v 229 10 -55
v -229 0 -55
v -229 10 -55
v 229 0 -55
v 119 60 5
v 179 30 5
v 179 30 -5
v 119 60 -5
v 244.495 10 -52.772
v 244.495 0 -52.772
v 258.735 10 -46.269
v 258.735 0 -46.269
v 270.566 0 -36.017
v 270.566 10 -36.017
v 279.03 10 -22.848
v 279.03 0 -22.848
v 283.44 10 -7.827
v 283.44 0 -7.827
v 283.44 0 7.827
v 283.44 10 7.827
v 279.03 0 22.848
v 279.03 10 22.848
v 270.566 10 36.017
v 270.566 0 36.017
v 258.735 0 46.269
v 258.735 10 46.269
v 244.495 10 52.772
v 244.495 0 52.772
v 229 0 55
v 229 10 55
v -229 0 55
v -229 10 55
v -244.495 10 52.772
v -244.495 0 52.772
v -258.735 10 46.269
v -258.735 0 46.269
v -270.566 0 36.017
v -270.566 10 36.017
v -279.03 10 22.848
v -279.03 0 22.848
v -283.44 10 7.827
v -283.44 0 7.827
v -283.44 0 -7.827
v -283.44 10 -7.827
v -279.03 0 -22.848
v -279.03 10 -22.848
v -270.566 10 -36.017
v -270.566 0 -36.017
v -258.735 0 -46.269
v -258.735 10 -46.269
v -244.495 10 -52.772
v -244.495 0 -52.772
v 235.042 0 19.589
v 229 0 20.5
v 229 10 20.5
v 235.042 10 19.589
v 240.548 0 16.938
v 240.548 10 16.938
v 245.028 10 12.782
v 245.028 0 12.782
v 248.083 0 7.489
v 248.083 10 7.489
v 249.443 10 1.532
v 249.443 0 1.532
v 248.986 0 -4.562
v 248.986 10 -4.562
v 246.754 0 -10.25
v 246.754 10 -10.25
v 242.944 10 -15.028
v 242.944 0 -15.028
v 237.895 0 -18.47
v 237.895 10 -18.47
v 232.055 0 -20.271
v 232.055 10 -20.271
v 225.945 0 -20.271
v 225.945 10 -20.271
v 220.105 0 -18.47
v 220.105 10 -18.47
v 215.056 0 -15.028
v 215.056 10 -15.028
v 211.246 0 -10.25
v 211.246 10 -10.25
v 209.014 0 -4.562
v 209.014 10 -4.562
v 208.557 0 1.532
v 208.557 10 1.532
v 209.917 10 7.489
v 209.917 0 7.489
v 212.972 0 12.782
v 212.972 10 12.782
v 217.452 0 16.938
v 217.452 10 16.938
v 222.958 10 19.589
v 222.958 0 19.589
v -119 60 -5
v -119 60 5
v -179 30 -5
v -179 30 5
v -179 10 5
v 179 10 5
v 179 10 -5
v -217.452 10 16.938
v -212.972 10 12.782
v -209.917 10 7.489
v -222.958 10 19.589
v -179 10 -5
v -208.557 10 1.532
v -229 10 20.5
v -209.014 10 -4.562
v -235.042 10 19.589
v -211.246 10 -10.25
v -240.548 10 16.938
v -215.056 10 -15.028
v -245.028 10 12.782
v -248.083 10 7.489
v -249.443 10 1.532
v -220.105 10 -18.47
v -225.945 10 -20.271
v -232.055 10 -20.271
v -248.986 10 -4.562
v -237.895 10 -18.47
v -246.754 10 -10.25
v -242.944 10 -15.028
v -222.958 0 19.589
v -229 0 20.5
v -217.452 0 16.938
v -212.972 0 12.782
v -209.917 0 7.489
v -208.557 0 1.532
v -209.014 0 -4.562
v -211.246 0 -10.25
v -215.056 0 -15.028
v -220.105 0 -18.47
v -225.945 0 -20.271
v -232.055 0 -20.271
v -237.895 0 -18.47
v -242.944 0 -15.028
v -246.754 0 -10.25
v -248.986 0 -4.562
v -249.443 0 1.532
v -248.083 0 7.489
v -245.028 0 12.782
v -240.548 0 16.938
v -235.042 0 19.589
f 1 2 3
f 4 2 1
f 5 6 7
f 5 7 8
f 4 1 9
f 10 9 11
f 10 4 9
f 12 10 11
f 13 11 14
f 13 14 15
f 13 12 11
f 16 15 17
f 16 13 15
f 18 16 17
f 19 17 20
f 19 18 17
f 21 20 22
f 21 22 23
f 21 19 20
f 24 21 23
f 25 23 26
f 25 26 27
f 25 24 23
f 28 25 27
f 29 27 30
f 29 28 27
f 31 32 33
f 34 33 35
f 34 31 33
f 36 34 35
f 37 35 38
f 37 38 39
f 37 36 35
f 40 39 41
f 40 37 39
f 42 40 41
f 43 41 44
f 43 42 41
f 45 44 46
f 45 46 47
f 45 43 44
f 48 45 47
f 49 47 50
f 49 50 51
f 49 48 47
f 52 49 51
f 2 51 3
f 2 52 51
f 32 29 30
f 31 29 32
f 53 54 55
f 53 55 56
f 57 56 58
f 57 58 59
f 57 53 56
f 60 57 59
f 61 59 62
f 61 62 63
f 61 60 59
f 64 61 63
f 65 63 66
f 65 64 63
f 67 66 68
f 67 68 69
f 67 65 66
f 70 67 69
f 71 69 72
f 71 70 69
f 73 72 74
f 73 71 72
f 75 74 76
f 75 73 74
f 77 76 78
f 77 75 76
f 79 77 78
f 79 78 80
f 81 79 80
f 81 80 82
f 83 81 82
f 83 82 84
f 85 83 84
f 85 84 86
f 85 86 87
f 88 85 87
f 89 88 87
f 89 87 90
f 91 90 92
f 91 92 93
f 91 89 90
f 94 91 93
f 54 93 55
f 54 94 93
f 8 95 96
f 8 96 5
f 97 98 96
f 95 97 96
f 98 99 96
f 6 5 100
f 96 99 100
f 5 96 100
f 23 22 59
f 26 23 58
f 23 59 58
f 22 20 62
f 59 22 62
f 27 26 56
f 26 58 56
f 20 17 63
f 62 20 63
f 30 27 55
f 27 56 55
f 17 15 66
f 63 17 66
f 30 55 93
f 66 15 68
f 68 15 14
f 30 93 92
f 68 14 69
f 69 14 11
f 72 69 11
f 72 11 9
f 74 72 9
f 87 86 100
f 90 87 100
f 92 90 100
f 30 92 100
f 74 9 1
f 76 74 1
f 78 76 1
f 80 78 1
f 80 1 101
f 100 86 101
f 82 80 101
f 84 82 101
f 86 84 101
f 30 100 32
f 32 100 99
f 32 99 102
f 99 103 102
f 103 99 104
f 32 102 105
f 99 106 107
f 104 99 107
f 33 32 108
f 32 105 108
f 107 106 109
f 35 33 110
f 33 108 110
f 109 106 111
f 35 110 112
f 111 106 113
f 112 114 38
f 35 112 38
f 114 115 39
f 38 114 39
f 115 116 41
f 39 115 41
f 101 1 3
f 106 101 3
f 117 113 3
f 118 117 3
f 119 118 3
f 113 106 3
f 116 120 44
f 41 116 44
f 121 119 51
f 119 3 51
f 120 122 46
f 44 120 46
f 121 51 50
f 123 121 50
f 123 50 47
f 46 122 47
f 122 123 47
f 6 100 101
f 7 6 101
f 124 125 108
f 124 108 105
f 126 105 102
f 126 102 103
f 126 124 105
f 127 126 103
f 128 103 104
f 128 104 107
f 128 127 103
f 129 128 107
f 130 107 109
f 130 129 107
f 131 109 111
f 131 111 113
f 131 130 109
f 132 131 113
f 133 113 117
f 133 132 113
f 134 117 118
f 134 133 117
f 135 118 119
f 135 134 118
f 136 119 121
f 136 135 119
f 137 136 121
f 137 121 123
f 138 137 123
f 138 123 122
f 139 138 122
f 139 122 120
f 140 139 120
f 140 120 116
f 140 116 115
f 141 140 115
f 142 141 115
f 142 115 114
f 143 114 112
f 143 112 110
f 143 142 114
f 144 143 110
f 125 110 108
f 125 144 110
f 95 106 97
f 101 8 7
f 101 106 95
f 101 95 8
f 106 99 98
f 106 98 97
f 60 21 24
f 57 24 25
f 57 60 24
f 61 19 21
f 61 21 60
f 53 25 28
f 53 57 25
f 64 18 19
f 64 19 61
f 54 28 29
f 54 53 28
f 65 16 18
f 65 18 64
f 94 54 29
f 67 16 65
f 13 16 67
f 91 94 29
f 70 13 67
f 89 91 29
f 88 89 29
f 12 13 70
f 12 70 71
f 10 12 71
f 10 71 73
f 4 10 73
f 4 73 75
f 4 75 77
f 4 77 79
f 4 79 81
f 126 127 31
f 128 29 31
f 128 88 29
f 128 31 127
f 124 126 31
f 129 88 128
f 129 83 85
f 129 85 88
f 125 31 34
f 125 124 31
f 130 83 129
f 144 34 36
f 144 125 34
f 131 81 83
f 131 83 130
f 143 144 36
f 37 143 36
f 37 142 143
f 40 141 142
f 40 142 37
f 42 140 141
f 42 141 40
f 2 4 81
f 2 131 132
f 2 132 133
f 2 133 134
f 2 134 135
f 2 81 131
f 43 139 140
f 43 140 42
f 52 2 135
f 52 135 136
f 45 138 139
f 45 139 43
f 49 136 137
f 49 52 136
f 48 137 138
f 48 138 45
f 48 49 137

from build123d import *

# Parameters (mm, degrees)
SKETCH_4_R          = 20.5
EXTRUDE_4_DEPTH     = 10
SKETCH_5_W          = 358
SKETCH_5_H          = 10
EXTRUDE_5_DEPTH     = 50
CUT_EXTRUDE_1_DEPTH = 297.405128161


with BuildPart() as part:
    # 草图4 → 凸台-拉伸4 (new body)
    with BuildSketch(Plane(origin=(0, 0, 0), x_dir=(1, 0, 0), z_dir=(0, 1, 0))):
        with BuildLine():
            Line((-229, 55), (229, 55))
            ThreePointArc((229, 55), (284, 0), (229, -55))
            Line((229, -55), (-229, -55))
            ThreePointArc((-229, -55), (-284, 0), (-229, 55))
        make_face()
        with Locations(Location((-229, 0, 0), (0, 0, 270))):
            Circle(SKETCH_4_R, mode=Mode.SUBTRACT)
        with Locations(Location((229, 0, 0), (0, 0, 270))):
            Circle(SKETCH_4_R, mode=Mode.SUBTRACT)
    extrude(amount=EXTRUDE_4_DEPTH)

    # 草图5 → 凸台-拉伸5 (add)
    with BuildSketch(Plane(origin=(0, 10, 0), x_dir=(1, 0, 0), z_dir=(0, 1, 0))):
        Rectangle(SKETCH_5_W, SKETCH_5_H)
    extrude(amount=EXTRUDE_5_DEPTH)

    # 草图6 → 切除-拉伸1 (cut, through all)
    with BuildSketch(Plane.XY.offset(5)):
        Polygon((-179, 60), (-179, 30), (-119, 60), align=None)
        Polygon((179, 60), (179, 30), (119, 60), align=None)
    extrude(amount=-CUT_EXTRUDE_1_DEPTH, mode=Mode.SUBTRACT)


solid = part.part
